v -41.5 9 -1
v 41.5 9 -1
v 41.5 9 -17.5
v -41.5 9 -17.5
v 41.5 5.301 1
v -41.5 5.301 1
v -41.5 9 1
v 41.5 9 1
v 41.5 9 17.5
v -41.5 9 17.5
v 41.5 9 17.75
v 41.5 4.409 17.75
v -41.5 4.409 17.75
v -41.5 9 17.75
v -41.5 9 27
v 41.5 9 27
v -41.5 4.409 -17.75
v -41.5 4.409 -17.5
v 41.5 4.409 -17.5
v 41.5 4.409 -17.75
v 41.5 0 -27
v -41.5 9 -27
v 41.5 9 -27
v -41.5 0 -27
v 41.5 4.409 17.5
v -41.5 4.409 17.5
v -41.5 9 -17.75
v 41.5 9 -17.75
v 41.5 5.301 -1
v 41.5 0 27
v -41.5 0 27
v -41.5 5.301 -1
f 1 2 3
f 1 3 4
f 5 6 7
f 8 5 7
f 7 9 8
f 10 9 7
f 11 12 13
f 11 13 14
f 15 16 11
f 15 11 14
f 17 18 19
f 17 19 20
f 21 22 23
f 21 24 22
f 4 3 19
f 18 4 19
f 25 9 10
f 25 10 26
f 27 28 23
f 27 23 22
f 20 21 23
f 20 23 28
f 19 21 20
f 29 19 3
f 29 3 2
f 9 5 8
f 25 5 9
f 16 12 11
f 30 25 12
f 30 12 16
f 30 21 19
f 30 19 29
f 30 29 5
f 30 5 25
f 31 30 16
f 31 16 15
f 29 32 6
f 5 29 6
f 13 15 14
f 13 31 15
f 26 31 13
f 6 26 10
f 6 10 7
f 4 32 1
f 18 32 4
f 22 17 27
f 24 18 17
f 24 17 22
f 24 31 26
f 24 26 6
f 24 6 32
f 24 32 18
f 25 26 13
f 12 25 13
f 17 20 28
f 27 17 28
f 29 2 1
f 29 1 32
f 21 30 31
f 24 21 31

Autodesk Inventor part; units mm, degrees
ref_plane "YZ Plane" through (0, 0, 0) normal (1, 0, 0) x (0, 1, 0)
ref_plane "XZ Plane" through (0, 0, 0) normal (0, 1, 0) x (-1, 0, 0)
ref_plane "XY Plane" through (0, 0, 0) normal (0, 0, 1) x (1, 0, 0)
sketch "Sketch1" plane through (0, 0, 0) normal (0, 1, 0) x (-1, 0, 0)
  line L0 (41.5, -27) -> (-41.5, -27)
  line L1 (-41.5, -27) -> (-41.5, 27)
  line L2 (-41.5, 27) -> (41.5, 27)
  line L3 (41.5, 27) -> (41.5, -27)
  line L4 (41.5, -27) -> (-41.5, 27) construction
  line L5 (-41.5, -27) -> (41.5, 27) construction
  point P0 (0, 0)
  dimension "d0" = 83
  dimension "d1" = 54
extrude "Extrusion1" add sketch "Sketch1" along normal blind 9
sketch "Sketch2" plane through (41.5, 0, 27) normal (1, 0, 0) x (0, 0, -1)
  line L0 (27, 0) -> (27, 8.8182) construction
  line L1 (27, 4.4091) -> (44.5, 4.4091) construction
  line L2 (44.5, 4.4091) -> (44.75, 4.4091)
  line L3 (44.75, 4.4091) -> (44.75, 11.998)
  line L4 (44.75, 11.998) -> (44.5, 11.998)
  line L5 (44.5, 11.998) -> (44.5, 4.4091)
  line L6 (9.5, 4.4091) -> (9.25, 4.4091)
  line L7 (9.25, 4.4091) -> (9.25, 11.998)
  line L8 (9.25, 11.998) -> (9.5, 11.998)
  line L9 (9.5, 11.998) -> (9.5, 4.4091)
  line L10 (26, 12.3352) -> (28, 12.3352)
  line L11 (28, 12.3352) -> (28, 5.3012)
  line L12 (28, 5.3012) -> (26, 5.3012)
  line L13 (26, 5.3012) -> (26, 12.3352)
  line L14 (26, 12.3352) -> (28, 5.3012) construction
  line L15 (28, 12.3352) -> (26, 5.3012) construction
  dimension "d4" = 17.5
  dimension "d5" = 0.25
  dimension "d6" = 2
  dimension "d7" = 7.034
extrude "Extrusion2" cut sketch "Sketch2" against normal blind 109.0125
properties part number "Small Bread Board" material "PC/ABS Plastic"
